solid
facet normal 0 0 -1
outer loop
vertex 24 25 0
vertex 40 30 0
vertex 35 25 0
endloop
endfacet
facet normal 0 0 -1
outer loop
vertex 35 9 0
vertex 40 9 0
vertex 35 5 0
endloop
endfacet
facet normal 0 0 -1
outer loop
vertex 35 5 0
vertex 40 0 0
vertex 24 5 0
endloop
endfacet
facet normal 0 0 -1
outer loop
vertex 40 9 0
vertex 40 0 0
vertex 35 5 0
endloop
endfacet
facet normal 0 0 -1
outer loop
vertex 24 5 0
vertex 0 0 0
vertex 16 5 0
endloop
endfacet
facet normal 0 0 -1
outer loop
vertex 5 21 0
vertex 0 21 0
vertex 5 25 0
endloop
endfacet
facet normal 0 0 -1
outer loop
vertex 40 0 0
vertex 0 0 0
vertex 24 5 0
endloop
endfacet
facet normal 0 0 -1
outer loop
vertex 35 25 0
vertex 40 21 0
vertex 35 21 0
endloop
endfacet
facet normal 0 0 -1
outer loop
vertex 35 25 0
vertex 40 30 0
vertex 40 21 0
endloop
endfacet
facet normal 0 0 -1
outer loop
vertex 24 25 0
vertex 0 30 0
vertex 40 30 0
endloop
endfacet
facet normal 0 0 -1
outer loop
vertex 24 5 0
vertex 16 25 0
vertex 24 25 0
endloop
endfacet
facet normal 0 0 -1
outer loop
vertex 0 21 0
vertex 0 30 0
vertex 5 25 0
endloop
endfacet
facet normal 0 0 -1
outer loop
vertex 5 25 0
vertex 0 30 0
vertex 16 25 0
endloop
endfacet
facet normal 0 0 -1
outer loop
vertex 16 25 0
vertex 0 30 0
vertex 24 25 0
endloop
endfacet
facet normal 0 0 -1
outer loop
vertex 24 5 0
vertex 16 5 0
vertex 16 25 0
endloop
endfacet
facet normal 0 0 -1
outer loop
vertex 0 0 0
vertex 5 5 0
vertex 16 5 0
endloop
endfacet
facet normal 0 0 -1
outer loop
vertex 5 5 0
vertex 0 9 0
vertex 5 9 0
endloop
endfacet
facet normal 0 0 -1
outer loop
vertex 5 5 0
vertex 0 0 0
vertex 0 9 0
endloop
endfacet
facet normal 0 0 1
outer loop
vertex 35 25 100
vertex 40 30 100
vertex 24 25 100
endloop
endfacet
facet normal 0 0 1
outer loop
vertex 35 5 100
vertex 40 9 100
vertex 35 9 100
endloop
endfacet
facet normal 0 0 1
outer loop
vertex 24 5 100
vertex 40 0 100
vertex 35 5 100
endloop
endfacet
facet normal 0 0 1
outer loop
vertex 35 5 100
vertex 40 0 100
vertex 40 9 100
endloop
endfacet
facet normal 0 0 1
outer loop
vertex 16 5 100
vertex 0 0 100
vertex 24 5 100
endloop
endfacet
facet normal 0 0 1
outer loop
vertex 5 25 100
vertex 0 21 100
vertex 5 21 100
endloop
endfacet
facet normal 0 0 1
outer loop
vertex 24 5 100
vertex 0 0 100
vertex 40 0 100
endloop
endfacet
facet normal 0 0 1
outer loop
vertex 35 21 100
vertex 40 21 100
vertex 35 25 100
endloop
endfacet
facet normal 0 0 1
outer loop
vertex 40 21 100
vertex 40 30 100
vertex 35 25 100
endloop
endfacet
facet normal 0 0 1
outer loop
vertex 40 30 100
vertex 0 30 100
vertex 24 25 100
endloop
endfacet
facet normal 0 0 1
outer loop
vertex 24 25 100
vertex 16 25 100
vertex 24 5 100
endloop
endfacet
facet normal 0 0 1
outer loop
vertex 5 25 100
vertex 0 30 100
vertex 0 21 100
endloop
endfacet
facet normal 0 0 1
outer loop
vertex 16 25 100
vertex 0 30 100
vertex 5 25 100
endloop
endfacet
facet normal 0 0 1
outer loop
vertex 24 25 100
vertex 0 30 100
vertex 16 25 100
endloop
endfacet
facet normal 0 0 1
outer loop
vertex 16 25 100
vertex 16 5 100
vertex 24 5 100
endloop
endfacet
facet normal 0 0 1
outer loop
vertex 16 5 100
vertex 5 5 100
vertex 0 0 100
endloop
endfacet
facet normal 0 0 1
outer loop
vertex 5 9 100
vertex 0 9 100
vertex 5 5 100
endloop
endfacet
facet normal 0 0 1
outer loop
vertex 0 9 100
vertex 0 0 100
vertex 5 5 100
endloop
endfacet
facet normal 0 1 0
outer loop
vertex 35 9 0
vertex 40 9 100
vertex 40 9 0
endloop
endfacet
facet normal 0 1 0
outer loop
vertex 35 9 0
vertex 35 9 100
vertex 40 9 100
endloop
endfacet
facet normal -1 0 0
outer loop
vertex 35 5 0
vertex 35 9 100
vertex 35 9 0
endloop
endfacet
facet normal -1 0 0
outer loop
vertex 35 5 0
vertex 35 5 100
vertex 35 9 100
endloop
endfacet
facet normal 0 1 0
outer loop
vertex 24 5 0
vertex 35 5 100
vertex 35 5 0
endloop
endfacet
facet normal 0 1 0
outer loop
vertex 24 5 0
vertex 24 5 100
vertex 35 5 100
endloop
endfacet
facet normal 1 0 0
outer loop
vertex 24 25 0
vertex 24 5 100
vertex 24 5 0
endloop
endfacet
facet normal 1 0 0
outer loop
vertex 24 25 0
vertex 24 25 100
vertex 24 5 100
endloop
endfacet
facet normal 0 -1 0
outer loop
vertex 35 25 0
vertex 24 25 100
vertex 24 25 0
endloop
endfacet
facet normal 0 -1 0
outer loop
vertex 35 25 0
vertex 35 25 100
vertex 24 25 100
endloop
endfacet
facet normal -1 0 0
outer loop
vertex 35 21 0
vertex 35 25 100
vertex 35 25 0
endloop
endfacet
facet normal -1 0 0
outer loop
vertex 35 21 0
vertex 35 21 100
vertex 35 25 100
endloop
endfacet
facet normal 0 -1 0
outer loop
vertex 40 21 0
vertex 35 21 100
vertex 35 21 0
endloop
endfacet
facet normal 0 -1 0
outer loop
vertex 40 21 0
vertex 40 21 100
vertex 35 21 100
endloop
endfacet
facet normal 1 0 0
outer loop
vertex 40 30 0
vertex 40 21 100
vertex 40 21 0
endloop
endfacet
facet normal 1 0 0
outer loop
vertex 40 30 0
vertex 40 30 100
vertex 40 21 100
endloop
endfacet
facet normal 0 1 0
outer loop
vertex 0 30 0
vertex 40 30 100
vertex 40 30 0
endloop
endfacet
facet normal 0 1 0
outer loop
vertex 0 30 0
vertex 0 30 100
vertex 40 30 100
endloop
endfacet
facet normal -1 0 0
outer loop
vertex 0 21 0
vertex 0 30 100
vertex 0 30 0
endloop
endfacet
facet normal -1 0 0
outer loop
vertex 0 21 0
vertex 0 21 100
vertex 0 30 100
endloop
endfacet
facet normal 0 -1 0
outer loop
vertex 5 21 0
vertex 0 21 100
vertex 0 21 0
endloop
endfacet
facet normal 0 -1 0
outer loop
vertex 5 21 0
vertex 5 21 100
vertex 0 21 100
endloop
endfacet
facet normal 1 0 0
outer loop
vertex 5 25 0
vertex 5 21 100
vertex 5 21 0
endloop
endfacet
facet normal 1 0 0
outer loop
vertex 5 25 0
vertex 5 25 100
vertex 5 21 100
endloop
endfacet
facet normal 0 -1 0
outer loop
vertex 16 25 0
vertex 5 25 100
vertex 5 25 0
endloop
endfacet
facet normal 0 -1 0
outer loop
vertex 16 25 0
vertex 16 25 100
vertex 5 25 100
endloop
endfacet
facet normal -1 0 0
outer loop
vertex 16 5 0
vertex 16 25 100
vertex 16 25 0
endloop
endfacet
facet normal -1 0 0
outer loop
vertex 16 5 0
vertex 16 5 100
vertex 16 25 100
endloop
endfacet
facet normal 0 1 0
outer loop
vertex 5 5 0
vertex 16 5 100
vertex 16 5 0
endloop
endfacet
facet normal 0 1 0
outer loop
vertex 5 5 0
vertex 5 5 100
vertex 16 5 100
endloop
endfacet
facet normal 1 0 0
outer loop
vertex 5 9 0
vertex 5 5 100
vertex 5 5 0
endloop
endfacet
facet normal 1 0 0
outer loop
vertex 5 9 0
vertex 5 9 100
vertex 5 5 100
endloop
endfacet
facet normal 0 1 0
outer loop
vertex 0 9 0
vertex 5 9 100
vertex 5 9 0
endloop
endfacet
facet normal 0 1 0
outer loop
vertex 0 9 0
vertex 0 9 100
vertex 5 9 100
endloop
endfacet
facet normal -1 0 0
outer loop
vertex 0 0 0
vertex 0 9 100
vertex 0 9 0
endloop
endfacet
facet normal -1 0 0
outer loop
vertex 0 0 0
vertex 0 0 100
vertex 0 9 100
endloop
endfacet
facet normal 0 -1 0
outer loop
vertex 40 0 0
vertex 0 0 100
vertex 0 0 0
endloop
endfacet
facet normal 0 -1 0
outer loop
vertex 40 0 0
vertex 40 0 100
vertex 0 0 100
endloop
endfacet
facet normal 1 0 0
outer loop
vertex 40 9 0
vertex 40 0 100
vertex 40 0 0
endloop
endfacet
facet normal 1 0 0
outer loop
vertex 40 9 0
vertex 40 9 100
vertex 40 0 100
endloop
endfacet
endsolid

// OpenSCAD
$fn = 32;

// ----------------------------------------------------------------------
// T-slot rail: 40 x 30 mm section, 100 mm long
// ----------------------------------------------------------------------

// --- parameters (mm) ---
profile_height = 100;     // extrusion height
profile_points = 20;      // points of the closed outline

profile = [[0, 0], [40, 0], [40, 9], [35, 9], [35, 5], [24, 5], [24, 25], [35, 25], [35, 21], [40, 21], [40, 30], [0, 30], [0, 21], [5, 21], [5, 25], [16, 25], [16, 5], [5, 5], [5, 9], [0, 9]];  // single closed polygon, 20 points, counter clockwise

// --- the one profile operation ---
linear_extrude(height = profile_height) polygon(points = profile);
